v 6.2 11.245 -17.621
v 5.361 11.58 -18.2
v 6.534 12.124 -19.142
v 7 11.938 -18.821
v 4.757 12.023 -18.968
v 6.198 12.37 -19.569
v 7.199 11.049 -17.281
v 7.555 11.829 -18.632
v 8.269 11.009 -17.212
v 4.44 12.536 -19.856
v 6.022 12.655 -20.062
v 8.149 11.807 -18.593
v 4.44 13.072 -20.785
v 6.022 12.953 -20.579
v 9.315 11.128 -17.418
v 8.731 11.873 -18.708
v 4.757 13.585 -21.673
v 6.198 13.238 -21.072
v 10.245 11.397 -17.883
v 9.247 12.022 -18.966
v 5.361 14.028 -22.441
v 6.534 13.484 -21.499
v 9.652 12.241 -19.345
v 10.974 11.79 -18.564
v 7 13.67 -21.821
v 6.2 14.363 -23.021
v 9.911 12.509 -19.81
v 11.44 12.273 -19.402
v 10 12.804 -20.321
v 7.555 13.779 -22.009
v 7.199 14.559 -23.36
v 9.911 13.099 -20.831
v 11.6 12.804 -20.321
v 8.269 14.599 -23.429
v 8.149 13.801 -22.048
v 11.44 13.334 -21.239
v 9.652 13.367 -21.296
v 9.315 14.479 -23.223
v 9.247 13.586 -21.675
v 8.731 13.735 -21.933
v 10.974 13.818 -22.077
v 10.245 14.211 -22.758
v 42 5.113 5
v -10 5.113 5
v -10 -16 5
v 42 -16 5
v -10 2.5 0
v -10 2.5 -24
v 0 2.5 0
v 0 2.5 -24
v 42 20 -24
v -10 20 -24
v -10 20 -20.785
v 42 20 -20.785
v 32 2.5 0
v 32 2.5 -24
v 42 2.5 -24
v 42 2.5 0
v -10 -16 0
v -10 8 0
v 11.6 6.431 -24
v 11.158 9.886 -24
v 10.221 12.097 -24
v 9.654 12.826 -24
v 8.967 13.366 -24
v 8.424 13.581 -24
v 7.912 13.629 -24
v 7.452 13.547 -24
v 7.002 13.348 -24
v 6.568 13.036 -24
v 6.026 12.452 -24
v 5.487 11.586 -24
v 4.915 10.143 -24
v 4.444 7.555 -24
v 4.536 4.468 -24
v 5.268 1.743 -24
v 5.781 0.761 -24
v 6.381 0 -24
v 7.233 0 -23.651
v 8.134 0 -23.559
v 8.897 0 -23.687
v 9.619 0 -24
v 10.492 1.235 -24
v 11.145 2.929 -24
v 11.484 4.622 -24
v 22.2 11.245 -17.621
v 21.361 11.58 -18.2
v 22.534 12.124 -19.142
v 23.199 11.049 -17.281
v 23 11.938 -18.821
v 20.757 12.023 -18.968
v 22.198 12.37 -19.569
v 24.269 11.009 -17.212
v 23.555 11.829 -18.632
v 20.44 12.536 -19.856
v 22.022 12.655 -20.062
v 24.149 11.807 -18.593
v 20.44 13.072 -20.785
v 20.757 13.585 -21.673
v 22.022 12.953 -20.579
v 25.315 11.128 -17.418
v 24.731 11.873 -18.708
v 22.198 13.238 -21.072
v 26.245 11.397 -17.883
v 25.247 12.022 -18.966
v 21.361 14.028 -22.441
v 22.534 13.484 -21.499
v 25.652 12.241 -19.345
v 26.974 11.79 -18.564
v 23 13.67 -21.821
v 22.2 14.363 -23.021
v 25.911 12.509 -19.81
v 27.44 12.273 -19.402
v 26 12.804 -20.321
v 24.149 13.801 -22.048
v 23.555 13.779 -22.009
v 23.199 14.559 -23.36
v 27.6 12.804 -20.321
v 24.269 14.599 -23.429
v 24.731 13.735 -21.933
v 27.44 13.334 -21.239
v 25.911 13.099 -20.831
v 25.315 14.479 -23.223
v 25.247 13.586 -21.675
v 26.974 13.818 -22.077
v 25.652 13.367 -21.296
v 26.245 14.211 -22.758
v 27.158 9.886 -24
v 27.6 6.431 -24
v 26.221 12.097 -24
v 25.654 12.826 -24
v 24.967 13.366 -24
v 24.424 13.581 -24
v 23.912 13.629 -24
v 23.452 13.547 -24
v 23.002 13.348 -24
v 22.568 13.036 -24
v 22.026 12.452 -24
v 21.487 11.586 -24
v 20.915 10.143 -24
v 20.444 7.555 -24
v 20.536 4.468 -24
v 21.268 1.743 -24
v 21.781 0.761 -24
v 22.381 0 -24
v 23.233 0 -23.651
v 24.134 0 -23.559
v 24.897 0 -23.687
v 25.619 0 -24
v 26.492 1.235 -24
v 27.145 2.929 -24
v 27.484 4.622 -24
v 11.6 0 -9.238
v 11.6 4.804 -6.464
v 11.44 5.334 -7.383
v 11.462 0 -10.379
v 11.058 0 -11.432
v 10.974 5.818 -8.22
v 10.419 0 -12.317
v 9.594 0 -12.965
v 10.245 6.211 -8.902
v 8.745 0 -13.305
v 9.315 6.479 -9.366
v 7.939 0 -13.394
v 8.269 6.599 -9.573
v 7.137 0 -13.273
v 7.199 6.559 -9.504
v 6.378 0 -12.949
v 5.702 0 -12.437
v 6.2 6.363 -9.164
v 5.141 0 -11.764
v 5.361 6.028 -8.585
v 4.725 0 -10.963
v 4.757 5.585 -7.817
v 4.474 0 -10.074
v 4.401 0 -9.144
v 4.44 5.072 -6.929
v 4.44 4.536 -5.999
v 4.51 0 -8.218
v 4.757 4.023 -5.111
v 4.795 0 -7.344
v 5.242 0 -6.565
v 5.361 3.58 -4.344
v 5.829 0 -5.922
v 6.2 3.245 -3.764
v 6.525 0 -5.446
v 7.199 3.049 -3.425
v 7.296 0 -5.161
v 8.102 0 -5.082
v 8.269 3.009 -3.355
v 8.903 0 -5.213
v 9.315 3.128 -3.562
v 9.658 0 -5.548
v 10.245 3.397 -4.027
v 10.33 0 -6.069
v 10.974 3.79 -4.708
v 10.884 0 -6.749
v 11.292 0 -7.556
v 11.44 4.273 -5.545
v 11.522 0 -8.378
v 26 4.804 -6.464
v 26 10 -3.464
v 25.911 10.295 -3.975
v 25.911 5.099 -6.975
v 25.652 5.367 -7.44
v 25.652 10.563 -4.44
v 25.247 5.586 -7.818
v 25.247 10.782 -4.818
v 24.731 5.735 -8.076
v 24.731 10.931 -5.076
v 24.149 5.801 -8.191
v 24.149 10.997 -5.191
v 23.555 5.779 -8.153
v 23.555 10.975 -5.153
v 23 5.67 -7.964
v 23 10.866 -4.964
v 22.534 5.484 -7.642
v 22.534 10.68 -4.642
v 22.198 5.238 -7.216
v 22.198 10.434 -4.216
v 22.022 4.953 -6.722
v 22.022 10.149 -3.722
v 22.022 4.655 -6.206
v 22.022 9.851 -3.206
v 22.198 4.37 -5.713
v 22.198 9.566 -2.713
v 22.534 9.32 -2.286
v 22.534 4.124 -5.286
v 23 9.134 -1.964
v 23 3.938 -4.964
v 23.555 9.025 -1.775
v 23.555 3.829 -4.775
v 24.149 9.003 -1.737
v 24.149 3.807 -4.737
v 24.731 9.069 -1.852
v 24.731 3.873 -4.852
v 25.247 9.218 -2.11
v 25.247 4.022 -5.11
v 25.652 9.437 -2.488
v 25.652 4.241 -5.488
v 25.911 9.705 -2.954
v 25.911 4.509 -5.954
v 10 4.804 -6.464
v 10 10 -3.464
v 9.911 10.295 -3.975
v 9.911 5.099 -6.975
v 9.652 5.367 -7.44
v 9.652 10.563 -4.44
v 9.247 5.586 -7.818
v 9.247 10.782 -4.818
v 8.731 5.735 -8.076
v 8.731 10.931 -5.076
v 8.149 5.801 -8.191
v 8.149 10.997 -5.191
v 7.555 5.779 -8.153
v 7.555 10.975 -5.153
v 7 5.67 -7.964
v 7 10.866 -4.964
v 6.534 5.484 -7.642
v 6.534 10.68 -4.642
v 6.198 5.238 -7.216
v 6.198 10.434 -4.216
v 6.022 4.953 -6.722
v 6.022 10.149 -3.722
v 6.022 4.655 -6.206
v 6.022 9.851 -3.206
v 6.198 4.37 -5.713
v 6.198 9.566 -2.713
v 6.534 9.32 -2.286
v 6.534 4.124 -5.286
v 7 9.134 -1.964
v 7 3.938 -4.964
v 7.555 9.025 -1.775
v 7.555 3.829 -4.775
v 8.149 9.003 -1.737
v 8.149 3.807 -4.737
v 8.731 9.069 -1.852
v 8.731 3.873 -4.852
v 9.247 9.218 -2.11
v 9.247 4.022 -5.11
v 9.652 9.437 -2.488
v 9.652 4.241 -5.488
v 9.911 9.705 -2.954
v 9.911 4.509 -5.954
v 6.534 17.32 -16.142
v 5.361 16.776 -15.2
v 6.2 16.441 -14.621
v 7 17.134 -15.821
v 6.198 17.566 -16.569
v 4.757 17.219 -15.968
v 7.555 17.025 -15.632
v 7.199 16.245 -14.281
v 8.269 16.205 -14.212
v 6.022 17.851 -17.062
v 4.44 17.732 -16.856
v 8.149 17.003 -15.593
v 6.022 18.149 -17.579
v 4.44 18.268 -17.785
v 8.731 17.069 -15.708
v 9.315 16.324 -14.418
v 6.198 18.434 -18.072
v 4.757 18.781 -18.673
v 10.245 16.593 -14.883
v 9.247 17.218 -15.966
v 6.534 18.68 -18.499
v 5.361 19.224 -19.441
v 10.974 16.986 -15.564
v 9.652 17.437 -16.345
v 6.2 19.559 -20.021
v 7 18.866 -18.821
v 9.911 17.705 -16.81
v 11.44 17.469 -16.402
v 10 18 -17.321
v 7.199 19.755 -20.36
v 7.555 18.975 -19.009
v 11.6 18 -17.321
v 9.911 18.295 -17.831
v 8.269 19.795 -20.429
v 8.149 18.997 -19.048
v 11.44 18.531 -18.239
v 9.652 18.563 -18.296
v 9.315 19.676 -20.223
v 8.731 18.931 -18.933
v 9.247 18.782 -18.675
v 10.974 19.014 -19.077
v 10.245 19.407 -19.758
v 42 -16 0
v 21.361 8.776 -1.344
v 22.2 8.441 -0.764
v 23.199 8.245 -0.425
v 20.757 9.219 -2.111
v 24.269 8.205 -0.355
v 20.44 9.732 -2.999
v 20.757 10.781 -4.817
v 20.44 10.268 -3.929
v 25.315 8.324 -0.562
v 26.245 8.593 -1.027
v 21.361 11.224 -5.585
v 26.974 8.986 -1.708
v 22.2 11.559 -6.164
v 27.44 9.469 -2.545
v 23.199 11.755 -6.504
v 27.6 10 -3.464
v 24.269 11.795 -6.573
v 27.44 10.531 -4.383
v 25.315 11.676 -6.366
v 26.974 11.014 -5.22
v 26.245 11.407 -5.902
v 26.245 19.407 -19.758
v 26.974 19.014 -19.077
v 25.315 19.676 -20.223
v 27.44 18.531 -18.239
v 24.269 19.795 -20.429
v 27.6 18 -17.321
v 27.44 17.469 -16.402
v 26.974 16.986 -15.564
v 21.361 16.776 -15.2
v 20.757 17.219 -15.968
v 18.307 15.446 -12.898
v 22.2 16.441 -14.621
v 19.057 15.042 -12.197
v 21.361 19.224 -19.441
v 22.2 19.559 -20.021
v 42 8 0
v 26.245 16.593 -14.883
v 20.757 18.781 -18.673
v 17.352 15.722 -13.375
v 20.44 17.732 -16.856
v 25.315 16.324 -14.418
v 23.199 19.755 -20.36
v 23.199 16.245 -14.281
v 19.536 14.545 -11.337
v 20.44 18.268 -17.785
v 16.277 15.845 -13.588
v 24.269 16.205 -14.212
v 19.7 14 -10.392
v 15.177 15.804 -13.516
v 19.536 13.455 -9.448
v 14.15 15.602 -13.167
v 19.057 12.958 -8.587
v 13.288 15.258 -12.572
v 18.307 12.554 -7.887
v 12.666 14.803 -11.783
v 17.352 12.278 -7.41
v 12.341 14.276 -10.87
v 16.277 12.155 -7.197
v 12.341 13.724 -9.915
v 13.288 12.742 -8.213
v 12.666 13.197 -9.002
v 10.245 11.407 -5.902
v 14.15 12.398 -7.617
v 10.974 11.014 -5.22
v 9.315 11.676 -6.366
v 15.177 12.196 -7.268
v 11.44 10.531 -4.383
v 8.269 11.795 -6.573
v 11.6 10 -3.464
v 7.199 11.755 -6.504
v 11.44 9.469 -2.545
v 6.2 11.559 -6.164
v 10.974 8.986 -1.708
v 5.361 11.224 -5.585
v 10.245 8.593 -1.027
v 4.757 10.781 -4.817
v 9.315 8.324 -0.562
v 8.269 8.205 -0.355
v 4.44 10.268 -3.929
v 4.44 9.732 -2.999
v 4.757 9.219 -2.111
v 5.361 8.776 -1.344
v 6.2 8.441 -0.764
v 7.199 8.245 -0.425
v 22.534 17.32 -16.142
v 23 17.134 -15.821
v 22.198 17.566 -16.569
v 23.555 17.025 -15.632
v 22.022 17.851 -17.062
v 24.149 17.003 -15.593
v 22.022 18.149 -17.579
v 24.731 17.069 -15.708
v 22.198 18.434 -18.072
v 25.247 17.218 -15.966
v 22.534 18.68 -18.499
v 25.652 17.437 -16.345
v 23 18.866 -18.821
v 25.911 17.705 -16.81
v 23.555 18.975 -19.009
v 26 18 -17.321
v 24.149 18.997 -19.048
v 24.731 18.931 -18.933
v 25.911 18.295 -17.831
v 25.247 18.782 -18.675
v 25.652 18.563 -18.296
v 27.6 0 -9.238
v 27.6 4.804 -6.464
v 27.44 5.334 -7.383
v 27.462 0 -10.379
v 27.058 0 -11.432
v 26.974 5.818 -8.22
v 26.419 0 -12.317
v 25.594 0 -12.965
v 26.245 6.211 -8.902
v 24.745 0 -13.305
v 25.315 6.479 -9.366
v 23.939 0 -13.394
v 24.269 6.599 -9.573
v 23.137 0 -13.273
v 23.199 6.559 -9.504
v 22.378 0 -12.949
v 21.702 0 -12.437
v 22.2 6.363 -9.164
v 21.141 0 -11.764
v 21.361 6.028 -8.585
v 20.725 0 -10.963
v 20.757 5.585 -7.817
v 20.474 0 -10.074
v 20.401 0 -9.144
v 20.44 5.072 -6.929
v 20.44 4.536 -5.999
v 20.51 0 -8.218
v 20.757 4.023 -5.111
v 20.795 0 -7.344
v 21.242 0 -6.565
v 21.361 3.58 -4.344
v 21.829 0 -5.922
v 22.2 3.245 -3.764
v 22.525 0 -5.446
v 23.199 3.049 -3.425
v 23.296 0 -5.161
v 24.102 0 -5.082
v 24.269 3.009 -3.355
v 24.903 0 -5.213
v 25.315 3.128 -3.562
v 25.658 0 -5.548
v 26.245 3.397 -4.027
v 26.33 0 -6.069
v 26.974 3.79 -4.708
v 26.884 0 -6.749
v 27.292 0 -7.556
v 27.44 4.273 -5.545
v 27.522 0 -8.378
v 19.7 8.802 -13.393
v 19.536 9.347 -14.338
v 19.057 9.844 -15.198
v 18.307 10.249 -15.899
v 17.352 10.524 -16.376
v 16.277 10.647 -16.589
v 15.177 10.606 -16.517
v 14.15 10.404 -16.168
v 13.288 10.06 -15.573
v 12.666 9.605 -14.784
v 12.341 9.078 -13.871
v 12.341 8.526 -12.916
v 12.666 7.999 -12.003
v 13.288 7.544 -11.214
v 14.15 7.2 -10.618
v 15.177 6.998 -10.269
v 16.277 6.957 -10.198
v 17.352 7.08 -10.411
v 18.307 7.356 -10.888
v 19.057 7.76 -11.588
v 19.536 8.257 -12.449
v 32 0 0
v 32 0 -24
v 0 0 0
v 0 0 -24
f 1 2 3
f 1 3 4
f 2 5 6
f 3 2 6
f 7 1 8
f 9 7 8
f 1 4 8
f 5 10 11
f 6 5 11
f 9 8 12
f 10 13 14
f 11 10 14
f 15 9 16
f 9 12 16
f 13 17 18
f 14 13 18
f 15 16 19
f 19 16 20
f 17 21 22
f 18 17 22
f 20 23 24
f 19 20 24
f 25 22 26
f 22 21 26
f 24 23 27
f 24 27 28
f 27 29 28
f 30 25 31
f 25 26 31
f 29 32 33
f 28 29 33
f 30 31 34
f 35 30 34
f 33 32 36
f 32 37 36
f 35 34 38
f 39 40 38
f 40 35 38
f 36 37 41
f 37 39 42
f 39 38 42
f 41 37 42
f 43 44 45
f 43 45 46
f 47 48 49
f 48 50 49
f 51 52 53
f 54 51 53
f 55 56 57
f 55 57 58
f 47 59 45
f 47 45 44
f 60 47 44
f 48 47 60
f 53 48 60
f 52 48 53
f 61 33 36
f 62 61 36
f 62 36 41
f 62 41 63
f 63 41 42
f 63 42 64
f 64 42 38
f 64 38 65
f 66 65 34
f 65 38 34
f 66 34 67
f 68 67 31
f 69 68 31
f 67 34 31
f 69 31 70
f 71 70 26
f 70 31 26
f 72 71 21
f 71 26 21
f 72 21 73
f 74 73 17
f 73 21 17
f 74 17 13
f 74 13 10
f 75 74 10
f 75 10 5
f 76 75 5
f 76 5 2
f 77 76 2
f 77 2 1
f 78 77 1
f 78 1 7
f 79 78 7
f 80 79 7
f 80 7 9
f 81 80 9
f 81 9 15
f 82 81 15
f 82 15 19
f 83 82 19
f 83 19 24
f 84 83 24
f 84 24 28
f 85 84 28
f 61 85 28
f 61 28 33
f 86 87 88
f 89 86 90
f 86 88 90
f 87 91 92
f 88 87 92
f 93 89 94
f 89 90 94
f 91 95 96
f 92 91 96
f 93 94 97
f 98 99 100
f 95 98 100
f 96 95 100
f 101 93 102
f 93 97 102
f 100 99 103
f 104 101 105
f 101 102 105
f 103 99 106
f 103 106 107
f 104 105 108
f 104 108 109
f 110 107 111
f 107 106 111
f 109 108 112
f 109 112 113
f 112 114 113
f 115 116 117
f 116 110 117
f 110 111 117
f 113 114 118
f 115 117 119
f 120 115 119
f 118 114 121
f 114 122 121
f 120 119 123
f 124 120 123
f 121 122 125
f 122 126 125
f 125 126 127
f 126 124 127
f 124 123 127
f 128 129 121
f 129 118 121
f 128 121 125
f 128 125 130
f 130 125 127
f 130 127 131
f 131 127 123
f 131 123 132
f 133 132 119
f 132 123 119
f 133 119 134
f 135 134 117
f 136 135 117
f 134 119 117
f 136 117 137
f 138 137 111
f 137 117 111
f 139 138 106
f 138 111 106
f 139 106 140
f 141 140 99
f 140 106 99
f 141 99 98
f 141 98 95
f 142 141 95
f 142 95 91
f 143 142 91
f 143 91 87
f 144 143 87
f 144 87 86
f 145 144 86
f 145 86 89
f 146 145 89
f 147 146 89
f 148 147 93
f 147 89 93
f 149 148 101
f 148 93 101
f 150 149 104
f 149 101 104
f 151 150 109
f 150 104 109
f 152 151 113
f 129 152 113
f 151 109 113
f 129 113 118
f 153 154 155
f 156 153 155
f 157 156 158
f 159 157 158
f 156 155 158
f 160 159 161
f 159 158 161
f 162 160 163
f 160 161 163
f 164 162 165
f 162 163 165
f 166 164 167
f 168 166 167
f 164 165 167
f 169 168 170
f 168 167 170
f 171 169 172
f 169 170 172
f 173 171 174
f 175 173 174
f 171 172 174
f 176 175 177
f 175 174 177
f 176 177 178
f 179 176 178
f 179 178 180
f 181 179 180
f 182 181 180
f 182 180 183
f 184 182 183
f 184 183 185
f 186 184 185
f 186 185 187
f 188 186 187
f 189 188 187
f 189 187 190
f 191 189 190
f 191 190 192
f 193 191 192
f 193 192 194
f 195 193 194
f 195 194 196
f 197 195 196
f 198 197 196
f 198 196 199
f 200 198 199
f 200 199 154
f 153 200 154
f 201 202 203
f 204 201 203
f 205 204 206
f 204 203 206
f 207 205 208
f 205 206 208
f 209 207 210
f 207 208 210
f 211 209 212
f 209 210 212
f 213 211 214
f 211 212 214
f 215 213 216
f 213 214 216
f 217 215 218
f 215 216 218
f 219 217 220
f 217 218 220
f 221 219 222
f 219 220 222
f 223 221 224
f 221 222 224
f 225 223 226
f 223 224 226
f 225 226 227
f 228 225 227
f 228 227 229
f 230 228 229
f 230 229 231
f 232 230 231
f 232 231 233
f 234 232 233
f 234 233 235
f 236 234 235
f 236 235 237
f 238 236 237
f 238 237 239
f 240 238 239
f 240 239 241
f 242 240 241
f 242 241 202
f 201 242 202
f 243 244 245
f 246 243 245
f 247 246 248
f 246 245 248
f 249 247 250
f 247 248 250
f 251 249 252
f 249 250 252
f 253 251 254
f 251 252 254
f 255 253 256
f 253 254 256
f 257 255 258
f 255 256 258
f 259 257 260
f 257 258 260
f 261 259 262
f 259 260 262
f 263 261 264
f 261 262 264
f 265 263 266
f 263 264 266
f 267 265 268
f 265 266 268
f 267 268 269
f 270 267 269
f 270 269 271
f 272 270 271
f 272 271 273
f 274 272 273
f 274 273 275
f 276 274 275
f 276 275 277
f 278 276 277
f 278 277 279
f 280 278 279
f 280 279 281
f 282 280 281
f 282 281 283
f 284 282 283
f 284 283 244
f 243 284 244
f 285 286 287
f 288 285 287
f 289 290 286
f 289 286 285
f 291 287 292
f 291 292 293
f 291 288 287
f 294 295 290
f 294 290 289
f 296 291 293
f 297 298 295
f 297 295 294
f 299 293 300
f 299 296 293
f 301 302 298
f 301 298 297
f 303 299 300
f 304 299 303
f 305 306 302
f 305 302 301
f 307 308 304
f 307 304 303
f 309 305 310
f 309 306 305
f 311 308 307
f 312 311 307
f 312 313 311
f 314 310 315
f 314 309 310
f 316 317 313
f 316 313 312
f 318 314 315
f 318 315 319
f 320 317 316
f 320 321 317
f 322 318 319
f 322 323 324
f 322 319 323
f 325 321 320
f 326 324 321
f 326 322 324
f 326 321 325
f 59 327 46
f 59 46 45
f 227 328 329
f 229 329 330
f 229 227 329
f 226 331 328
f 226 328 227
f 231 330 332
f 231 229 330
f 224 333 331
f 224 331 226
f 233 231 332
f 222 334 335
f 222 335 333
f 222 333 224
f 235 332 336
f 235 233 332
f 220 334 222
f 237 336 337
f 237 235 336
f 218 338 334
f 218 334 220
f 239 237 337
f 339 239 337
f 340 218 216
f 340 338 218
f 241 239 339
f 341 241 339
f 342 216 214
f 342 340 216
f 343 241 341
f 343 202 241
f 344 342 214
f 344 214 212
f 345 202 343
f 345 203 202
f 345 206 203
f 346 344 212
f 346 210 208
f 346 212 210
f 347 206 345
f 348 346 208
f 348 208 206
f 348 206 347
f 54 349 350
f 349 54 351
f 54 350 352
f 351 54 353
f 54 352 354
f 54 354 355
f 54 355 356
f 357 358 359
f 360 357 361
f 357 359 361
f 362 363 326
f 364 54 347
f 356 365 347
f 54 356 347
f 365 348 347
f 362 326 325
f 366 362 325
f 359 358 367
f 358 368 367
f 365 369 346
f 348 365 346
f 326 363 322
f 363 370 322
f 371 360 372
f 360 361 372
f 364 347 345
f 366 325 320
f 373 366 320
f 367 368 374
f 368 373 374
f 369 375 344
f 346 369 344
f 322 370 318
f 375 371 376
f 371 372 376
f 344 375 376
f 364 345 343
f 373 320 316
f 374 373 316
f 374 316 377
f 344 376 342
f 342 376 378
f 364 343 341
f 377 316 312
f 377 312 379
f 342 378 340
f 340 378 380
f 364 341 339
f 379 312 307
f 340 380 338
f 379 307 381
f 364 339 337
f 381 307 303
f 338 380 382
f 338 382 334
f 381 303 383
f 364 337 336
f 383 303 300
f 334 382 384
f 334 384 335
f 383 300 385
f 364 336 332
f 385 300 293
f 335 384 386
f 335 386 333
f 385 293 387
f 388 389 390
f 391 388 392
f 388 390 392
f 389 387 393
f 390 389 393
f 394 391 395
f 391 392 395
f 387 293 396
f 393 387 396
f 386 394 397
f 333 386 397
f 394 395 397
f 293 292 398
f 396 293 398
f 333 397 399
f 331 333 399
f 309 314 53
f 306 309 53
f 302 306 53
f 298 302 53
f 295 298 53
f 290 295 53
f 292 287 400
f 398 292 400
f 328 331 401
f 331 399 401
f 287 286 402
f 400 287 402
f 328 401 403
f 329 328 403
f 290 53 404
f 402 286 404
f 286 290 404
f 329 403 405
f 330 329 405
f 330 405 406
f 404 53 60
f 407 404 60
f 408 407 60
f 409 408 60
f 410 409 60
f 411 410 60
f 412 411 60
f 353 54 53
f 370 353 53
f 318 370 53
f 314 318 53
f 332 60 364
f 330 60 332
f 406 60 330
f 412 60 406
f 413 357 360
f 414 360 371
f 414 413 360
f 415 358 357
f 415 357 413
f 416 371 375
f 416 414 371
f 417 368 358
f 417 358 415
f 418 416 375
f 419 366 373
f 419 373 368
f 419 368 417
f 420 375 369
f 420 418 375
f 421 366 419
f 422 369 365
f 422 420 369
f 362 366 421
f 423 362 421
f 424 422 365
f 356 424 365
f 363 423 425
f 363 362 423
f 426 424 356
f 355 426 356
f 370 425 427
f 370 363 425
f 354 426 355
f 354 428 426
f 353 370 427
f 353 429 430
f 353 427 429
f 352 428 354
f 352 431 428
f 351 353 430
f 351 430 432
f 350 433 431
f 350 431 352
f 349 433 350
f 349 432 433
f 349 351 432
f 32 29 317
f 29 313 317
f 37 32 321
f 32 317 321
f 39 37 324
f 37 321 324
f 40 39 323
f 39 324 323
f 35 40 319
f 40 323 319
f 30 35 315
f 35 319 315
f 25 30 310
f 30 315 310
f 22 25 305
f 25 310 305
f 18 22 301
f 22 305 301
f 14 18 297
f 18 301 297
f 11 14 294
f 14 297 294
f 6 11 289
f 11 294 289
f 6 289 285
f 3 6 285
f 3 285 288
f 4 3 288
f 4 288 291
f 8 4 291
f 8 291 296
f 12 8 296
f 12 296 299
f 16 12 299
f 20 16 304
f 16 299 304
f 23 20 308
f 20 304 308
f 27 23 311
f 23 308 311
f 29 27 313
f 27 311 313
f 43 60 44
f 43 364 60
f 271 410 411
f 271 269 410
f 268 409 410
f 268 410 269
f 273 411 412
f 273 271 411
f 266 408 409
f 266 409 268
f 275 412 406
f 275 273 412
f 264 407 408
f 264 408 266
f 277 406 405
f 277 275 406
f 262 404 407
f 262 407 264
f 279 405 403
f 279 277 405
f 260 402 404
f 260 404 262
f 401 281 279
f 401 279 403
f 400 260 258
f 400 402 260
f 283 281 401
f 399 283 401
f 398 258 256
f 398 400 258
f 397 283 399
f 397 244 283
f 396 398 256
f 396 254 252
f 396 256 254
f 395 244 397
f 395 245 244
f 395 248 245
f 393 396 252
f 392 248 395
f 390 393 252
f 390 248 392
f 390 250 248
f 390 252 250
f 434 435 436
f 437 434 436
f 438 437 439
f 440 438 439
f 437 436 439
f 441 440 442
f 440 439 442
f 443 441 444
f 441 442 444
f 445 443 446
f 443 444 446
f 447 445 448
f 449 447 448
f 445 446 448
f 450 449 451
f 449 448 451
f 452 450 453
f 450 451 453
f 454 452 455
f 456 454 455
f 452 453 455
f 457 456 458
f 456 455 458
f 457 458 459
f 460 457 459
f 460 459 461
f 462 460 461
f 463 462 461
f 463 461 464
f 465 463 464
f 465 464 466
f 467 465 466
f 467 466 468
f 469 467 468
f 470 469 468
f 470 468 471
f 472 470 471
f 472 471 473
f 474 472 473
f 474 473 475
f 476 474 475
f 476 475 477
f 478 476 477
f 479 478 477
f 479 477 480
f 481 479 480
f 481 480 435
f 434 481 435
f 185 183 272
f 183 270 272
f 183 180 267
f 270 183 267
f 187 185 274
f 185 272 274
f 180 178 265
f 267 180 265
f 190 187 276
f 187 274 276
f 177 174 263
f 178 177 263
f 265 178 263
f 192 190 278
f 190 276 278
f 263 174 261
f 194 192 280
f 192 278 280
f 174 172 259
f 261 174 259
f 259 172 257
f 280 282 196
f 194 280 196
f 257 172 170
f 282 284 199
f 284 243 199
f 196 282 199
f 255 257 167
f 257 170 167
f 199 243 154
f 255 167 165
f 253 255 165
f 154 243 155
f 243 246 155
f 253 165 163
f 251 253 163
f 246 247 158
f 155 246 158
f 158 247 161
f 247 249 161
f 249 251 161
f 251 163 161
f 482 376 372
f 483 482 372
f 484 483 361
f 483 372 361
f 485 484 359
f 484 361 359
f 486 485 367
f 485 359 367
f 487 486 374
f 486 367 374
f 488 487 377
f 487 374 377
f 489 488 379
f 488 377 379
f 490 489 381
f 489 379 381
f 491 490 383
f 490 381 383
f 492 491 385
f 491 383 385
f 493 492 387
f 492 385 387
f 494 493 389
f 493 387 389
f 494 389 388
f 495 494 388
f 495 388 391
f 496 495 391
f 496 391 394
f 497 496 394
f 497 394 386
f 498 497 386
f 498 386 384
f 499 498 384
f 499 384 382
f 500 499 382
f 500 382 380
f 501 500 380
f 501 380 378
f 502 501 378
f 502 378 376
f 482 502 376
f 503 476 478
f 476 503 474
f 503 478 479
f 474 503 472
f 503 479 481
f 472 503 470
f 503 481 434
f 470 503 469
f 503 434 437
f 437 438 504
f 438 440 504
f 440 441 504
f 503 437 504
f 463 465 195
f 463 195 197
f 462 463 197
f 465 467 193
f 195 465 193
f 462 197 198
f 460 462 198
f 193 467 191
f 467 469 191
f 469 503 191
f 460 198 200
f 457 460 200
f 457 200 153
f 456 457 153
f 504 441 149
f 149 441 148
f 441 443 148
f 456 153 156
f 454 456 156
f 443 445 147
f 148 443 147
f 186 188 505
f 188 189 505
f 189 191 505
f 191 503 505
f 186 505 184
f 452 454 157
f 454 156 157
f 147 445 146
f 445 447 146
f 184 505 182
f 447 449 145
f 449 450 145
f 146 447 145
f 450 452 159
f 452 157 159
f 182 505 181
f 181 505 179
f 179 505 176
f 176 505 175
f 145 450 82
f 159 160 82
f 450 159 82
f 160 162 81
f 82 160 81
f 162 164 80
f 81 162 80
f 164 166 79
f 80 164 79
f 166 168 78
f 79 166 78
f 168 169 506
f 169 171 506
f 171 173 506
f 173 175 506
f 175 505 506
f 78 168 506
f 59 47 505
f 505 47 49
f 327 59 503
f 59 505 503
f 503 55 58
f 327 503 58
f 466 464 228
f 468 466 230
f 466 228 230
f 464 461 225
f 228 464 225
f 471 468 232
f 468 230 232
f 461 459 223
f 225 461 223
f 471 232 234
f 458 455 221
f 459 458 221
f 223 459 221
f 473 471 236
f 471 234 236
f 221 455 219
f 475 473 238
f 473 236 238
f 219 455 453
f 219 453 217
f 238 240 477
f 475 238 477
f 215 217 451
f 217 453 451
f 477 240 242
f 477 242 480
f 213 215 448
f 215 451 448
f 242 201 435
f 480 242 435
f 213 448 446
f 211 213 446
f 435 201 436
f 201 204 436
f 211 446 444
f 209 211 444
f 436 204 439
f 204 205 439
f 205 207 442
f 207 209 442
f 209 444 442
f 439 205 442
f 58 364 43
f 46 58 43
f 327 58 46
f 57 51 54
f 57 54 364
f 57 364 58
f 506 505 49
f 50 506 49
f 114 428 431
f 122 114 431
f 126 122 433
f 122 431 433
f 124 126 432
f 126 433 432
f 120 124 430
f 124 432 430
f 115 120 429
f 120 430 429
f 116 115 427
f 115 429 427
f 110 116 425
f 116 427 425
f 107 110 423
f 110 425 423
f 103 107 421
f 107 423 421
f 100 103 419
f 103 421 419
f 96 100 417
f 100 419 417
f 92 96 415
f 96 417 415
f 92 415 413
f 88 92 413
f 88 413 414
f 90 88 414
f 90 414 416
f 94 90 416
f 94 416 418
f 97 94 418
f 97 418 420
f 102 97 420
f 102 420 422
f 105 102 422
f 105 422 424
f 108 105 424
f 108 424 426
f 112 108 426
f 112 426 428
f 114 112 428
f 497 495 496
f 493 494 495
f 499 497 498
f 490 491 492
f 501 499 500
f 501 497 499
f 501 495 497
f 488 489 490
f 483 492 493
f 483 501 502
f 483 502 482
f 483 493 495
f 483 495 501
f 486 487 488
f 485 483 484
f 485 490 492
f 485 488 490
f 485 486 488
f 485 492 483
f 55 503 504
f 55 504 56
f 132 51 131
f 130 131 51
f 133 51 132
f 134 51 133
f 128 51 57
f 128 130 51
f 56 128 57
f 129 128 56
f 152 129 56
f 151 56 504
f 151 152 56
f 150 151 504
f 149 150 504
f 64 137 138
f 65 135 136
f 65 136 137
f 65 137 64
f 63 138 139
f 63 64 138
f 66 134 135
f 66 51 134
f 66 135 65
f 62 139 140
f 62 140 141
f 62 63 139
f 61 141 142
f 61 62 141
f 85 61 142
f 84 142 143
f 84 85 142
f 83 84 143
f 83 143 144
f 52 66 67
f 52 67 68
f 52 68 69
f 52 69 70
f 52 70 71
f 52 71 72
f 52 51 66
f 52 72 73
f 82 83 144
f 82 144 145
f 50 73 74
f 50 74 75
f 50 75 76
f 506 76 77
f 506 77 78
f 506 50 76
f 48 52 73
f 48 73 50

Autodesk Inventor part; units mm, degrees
ref_plane "YZ Plane" through (0, 0, 0) normal (1, 0, 0) x (0, 1, 0)
ref_plane "XZ Plane" through (0, 0, 0) normal (0, 1, 0) x (-1, 0, 0)
ref_plane "XY Plane" through (0, 0, 0) normal (0, 0, 1) x (1, 0, 0)
sketch "Sketch1" plane through (0, 0, 0) normal (1, 0, 0) x (0, 1, 0)
  line L0 (0, 0) -> (0, -24)
  line L1 (0, -24) -> (20, -24)
  line L2 (20, -24) -> (20, -20.7846)
  line L3 (20, -20.7846) -> (8, 0)
  line L4 (8, 0) -> (0, 0)
  dimension "d0" = 120
  dimension "d1" = 24
  dimension "d2" = 8
  dimension "d3" = 20
extrude "Extrusion1" add sketch "Sketch1" along normal blind 32
sketch "Sketch3" plane through (0, 8, 0) normal (0, 0.866, 0.5) x (1, 0, 0)
  circle A0 centre (8, 20) radius 3.6
  circle A1 centre (24, 20) radius 3.6
  circle A2 centre (24, 4) radius 3.6
  circle A3 centre (8, 4) radius 3.6
  line L0 (0, 0) -> (32, 0) projected
  line L1 (32, 24) -> (32, 0) projected
  line L2 (0, 24) -> (32, 24) projected
  circle A4 centre (16, 12) radius 3.7
  point P0 (0, -4)
  dimension "d17" = 7.2
  dimension "d18" = 7.2
  dimension "d19" = 7.2
  dimension "d20" = 7.2
  dimension "d21" = 16
  dimension "d22" = 16
  dimension "d23" = 16
  dimension "d25" = 8
  dimension "d26" = 4
  dimension "d29" = 7.4
  dimension "d30" = 8
  dimension "d31" = 8
extrude "Extrusion2" cut sketch "Sketch3" against normal through all contours A0 | A1 | A2 | A3
extrude "Extrusion3" cut sketch "Sketch3" against normal blind 6 contours A4
sketch "Sketch4" plane through (0, 8, 0) normal (0, 0.866, 0.5) x (1, 0, 0)
  circle A0 centre (24, 20) radius 2
  circle A1 centre (8, 20) radius 2
  circle A2 centre (24, 4) radius 2
  circle A3 centre (8, 4) radius 2
  circle A4 centre (24, 20) radius 3.6 projected
  circle A5 centre (8, 20) radius 3.6 projected
  circle A6 centre (8, 4) radius 3.6 projected
  circle A7 centre (24, 4) radius 3.6 projected
  circle A8 centre (8, 20) radius 3.6
  circle A9 centre (24, 20) radius 3.6
  circle A10 centre (24, 4) radius 3.6
  circle A11 centre (8, 4) radius 3.6
  point P0 (0, -4)
  dimension "d34" = 4
  dimension "d35" = 4
  dimension "d36" = 4
  dimension "d37" = 4
  dimension "d38" = 7.2
  dimension "d39" = 7.2
  dimension "d40" = 7.2
  dimension "d41" = 7.2
extrude "Extrusion4" add sketch "Sketch4" against normal blind 6
sketch "Sketch7" plane through (0, 0, 0) normal (-1, 0, 0) x (0, 0, 1)
  line L0 (-24, 20) -> (-20.7846, 20) projected
  line L1 (-24, 20) -> (-24, 2.5)
  line L2 (-24, 0) -> (-24, 13.6308) projected
  line L3 (-24, 2.5) -> (0, 2.5)
  line L4 (-20.7846, 20) -> (0, 8) projected
  line L5 (0, 2.5) -> (0, 8)
  line L6 (0, 8) -> (-20.7846, 20)
  line L7 (-20.7846, 20) -> (-24, 20)
  point P0 (0, 0)
  dimension "d52" = 17.5
extrude "Extrusion7" add sketch "Sketch7" along normal blind 10
sketch "Sketch8" plane through (32, 0, 0) normal (1, 0, 0) x (0, 0, -1)
  line L0 (24, 20) -> (20.7846, 20) projected
  line L1 (24, 20) -> (24, 2.5)
  line L2 (24, 13.6308) -> (24, 0) projected
  line L3 (24, 2.5) -> (0, 2.5)
  line L4 (20.7846, 20) -> (0, 8) projected
  line L5 (0, 2.5) -> (0, 8)
  line L6 (0, 8) -> (20.7846, 20)
  line L7 (20.7846, 20) -> (24, 20)
  point P0 (0, 0)
  dimension "d55" = 17.5
extrude "Extrusion8" add sketch "Sketch8" along normal blind 10
sketch "Sketch9" plane through (0, 0, 0) normal (0, 0, 1) x (1, 0, 0)
  line L0 (-10, 8) -> (42, 8) projected
  line L1 (-10, 8) -> (42, 8)
  line L2 (42, 8) -> (42, -16)
  line L3 (42, -16) -> (-10, -16)
  line L4 (-10, -16) -> (-10, 8)
  point P0 (0, 0)
  dimension "d58" = 24
  dimension "d59" = 52
extrude "Extrusion9" add sketch "Sketch9" along normal blind 5
sketch "Sketch10" plane through (42, 0, 0) normal (1, 0, 0) x (0, 0, -1)
  line L0 (0, 8) -> (-8.6359, 3.0141)
  line L1 (-8.6359, 3.0141) -> (-8.6359, 11.5347)
  line L2 (-5, 8) -> (-5, -16) projected
  line L3 (-8.6359, 11.5347) -> (0, 11.5347)
  line L4 (0, 11.5347) -> (0, 8)
  line L5 (20.7846, 20) -> (0, 8) projected
  point P0 (0, 0)
  dimension "d62" = 180
extrude "Extrusion10" cut sketch "Sketch10" against normal through all
properties part number "intakemount"
